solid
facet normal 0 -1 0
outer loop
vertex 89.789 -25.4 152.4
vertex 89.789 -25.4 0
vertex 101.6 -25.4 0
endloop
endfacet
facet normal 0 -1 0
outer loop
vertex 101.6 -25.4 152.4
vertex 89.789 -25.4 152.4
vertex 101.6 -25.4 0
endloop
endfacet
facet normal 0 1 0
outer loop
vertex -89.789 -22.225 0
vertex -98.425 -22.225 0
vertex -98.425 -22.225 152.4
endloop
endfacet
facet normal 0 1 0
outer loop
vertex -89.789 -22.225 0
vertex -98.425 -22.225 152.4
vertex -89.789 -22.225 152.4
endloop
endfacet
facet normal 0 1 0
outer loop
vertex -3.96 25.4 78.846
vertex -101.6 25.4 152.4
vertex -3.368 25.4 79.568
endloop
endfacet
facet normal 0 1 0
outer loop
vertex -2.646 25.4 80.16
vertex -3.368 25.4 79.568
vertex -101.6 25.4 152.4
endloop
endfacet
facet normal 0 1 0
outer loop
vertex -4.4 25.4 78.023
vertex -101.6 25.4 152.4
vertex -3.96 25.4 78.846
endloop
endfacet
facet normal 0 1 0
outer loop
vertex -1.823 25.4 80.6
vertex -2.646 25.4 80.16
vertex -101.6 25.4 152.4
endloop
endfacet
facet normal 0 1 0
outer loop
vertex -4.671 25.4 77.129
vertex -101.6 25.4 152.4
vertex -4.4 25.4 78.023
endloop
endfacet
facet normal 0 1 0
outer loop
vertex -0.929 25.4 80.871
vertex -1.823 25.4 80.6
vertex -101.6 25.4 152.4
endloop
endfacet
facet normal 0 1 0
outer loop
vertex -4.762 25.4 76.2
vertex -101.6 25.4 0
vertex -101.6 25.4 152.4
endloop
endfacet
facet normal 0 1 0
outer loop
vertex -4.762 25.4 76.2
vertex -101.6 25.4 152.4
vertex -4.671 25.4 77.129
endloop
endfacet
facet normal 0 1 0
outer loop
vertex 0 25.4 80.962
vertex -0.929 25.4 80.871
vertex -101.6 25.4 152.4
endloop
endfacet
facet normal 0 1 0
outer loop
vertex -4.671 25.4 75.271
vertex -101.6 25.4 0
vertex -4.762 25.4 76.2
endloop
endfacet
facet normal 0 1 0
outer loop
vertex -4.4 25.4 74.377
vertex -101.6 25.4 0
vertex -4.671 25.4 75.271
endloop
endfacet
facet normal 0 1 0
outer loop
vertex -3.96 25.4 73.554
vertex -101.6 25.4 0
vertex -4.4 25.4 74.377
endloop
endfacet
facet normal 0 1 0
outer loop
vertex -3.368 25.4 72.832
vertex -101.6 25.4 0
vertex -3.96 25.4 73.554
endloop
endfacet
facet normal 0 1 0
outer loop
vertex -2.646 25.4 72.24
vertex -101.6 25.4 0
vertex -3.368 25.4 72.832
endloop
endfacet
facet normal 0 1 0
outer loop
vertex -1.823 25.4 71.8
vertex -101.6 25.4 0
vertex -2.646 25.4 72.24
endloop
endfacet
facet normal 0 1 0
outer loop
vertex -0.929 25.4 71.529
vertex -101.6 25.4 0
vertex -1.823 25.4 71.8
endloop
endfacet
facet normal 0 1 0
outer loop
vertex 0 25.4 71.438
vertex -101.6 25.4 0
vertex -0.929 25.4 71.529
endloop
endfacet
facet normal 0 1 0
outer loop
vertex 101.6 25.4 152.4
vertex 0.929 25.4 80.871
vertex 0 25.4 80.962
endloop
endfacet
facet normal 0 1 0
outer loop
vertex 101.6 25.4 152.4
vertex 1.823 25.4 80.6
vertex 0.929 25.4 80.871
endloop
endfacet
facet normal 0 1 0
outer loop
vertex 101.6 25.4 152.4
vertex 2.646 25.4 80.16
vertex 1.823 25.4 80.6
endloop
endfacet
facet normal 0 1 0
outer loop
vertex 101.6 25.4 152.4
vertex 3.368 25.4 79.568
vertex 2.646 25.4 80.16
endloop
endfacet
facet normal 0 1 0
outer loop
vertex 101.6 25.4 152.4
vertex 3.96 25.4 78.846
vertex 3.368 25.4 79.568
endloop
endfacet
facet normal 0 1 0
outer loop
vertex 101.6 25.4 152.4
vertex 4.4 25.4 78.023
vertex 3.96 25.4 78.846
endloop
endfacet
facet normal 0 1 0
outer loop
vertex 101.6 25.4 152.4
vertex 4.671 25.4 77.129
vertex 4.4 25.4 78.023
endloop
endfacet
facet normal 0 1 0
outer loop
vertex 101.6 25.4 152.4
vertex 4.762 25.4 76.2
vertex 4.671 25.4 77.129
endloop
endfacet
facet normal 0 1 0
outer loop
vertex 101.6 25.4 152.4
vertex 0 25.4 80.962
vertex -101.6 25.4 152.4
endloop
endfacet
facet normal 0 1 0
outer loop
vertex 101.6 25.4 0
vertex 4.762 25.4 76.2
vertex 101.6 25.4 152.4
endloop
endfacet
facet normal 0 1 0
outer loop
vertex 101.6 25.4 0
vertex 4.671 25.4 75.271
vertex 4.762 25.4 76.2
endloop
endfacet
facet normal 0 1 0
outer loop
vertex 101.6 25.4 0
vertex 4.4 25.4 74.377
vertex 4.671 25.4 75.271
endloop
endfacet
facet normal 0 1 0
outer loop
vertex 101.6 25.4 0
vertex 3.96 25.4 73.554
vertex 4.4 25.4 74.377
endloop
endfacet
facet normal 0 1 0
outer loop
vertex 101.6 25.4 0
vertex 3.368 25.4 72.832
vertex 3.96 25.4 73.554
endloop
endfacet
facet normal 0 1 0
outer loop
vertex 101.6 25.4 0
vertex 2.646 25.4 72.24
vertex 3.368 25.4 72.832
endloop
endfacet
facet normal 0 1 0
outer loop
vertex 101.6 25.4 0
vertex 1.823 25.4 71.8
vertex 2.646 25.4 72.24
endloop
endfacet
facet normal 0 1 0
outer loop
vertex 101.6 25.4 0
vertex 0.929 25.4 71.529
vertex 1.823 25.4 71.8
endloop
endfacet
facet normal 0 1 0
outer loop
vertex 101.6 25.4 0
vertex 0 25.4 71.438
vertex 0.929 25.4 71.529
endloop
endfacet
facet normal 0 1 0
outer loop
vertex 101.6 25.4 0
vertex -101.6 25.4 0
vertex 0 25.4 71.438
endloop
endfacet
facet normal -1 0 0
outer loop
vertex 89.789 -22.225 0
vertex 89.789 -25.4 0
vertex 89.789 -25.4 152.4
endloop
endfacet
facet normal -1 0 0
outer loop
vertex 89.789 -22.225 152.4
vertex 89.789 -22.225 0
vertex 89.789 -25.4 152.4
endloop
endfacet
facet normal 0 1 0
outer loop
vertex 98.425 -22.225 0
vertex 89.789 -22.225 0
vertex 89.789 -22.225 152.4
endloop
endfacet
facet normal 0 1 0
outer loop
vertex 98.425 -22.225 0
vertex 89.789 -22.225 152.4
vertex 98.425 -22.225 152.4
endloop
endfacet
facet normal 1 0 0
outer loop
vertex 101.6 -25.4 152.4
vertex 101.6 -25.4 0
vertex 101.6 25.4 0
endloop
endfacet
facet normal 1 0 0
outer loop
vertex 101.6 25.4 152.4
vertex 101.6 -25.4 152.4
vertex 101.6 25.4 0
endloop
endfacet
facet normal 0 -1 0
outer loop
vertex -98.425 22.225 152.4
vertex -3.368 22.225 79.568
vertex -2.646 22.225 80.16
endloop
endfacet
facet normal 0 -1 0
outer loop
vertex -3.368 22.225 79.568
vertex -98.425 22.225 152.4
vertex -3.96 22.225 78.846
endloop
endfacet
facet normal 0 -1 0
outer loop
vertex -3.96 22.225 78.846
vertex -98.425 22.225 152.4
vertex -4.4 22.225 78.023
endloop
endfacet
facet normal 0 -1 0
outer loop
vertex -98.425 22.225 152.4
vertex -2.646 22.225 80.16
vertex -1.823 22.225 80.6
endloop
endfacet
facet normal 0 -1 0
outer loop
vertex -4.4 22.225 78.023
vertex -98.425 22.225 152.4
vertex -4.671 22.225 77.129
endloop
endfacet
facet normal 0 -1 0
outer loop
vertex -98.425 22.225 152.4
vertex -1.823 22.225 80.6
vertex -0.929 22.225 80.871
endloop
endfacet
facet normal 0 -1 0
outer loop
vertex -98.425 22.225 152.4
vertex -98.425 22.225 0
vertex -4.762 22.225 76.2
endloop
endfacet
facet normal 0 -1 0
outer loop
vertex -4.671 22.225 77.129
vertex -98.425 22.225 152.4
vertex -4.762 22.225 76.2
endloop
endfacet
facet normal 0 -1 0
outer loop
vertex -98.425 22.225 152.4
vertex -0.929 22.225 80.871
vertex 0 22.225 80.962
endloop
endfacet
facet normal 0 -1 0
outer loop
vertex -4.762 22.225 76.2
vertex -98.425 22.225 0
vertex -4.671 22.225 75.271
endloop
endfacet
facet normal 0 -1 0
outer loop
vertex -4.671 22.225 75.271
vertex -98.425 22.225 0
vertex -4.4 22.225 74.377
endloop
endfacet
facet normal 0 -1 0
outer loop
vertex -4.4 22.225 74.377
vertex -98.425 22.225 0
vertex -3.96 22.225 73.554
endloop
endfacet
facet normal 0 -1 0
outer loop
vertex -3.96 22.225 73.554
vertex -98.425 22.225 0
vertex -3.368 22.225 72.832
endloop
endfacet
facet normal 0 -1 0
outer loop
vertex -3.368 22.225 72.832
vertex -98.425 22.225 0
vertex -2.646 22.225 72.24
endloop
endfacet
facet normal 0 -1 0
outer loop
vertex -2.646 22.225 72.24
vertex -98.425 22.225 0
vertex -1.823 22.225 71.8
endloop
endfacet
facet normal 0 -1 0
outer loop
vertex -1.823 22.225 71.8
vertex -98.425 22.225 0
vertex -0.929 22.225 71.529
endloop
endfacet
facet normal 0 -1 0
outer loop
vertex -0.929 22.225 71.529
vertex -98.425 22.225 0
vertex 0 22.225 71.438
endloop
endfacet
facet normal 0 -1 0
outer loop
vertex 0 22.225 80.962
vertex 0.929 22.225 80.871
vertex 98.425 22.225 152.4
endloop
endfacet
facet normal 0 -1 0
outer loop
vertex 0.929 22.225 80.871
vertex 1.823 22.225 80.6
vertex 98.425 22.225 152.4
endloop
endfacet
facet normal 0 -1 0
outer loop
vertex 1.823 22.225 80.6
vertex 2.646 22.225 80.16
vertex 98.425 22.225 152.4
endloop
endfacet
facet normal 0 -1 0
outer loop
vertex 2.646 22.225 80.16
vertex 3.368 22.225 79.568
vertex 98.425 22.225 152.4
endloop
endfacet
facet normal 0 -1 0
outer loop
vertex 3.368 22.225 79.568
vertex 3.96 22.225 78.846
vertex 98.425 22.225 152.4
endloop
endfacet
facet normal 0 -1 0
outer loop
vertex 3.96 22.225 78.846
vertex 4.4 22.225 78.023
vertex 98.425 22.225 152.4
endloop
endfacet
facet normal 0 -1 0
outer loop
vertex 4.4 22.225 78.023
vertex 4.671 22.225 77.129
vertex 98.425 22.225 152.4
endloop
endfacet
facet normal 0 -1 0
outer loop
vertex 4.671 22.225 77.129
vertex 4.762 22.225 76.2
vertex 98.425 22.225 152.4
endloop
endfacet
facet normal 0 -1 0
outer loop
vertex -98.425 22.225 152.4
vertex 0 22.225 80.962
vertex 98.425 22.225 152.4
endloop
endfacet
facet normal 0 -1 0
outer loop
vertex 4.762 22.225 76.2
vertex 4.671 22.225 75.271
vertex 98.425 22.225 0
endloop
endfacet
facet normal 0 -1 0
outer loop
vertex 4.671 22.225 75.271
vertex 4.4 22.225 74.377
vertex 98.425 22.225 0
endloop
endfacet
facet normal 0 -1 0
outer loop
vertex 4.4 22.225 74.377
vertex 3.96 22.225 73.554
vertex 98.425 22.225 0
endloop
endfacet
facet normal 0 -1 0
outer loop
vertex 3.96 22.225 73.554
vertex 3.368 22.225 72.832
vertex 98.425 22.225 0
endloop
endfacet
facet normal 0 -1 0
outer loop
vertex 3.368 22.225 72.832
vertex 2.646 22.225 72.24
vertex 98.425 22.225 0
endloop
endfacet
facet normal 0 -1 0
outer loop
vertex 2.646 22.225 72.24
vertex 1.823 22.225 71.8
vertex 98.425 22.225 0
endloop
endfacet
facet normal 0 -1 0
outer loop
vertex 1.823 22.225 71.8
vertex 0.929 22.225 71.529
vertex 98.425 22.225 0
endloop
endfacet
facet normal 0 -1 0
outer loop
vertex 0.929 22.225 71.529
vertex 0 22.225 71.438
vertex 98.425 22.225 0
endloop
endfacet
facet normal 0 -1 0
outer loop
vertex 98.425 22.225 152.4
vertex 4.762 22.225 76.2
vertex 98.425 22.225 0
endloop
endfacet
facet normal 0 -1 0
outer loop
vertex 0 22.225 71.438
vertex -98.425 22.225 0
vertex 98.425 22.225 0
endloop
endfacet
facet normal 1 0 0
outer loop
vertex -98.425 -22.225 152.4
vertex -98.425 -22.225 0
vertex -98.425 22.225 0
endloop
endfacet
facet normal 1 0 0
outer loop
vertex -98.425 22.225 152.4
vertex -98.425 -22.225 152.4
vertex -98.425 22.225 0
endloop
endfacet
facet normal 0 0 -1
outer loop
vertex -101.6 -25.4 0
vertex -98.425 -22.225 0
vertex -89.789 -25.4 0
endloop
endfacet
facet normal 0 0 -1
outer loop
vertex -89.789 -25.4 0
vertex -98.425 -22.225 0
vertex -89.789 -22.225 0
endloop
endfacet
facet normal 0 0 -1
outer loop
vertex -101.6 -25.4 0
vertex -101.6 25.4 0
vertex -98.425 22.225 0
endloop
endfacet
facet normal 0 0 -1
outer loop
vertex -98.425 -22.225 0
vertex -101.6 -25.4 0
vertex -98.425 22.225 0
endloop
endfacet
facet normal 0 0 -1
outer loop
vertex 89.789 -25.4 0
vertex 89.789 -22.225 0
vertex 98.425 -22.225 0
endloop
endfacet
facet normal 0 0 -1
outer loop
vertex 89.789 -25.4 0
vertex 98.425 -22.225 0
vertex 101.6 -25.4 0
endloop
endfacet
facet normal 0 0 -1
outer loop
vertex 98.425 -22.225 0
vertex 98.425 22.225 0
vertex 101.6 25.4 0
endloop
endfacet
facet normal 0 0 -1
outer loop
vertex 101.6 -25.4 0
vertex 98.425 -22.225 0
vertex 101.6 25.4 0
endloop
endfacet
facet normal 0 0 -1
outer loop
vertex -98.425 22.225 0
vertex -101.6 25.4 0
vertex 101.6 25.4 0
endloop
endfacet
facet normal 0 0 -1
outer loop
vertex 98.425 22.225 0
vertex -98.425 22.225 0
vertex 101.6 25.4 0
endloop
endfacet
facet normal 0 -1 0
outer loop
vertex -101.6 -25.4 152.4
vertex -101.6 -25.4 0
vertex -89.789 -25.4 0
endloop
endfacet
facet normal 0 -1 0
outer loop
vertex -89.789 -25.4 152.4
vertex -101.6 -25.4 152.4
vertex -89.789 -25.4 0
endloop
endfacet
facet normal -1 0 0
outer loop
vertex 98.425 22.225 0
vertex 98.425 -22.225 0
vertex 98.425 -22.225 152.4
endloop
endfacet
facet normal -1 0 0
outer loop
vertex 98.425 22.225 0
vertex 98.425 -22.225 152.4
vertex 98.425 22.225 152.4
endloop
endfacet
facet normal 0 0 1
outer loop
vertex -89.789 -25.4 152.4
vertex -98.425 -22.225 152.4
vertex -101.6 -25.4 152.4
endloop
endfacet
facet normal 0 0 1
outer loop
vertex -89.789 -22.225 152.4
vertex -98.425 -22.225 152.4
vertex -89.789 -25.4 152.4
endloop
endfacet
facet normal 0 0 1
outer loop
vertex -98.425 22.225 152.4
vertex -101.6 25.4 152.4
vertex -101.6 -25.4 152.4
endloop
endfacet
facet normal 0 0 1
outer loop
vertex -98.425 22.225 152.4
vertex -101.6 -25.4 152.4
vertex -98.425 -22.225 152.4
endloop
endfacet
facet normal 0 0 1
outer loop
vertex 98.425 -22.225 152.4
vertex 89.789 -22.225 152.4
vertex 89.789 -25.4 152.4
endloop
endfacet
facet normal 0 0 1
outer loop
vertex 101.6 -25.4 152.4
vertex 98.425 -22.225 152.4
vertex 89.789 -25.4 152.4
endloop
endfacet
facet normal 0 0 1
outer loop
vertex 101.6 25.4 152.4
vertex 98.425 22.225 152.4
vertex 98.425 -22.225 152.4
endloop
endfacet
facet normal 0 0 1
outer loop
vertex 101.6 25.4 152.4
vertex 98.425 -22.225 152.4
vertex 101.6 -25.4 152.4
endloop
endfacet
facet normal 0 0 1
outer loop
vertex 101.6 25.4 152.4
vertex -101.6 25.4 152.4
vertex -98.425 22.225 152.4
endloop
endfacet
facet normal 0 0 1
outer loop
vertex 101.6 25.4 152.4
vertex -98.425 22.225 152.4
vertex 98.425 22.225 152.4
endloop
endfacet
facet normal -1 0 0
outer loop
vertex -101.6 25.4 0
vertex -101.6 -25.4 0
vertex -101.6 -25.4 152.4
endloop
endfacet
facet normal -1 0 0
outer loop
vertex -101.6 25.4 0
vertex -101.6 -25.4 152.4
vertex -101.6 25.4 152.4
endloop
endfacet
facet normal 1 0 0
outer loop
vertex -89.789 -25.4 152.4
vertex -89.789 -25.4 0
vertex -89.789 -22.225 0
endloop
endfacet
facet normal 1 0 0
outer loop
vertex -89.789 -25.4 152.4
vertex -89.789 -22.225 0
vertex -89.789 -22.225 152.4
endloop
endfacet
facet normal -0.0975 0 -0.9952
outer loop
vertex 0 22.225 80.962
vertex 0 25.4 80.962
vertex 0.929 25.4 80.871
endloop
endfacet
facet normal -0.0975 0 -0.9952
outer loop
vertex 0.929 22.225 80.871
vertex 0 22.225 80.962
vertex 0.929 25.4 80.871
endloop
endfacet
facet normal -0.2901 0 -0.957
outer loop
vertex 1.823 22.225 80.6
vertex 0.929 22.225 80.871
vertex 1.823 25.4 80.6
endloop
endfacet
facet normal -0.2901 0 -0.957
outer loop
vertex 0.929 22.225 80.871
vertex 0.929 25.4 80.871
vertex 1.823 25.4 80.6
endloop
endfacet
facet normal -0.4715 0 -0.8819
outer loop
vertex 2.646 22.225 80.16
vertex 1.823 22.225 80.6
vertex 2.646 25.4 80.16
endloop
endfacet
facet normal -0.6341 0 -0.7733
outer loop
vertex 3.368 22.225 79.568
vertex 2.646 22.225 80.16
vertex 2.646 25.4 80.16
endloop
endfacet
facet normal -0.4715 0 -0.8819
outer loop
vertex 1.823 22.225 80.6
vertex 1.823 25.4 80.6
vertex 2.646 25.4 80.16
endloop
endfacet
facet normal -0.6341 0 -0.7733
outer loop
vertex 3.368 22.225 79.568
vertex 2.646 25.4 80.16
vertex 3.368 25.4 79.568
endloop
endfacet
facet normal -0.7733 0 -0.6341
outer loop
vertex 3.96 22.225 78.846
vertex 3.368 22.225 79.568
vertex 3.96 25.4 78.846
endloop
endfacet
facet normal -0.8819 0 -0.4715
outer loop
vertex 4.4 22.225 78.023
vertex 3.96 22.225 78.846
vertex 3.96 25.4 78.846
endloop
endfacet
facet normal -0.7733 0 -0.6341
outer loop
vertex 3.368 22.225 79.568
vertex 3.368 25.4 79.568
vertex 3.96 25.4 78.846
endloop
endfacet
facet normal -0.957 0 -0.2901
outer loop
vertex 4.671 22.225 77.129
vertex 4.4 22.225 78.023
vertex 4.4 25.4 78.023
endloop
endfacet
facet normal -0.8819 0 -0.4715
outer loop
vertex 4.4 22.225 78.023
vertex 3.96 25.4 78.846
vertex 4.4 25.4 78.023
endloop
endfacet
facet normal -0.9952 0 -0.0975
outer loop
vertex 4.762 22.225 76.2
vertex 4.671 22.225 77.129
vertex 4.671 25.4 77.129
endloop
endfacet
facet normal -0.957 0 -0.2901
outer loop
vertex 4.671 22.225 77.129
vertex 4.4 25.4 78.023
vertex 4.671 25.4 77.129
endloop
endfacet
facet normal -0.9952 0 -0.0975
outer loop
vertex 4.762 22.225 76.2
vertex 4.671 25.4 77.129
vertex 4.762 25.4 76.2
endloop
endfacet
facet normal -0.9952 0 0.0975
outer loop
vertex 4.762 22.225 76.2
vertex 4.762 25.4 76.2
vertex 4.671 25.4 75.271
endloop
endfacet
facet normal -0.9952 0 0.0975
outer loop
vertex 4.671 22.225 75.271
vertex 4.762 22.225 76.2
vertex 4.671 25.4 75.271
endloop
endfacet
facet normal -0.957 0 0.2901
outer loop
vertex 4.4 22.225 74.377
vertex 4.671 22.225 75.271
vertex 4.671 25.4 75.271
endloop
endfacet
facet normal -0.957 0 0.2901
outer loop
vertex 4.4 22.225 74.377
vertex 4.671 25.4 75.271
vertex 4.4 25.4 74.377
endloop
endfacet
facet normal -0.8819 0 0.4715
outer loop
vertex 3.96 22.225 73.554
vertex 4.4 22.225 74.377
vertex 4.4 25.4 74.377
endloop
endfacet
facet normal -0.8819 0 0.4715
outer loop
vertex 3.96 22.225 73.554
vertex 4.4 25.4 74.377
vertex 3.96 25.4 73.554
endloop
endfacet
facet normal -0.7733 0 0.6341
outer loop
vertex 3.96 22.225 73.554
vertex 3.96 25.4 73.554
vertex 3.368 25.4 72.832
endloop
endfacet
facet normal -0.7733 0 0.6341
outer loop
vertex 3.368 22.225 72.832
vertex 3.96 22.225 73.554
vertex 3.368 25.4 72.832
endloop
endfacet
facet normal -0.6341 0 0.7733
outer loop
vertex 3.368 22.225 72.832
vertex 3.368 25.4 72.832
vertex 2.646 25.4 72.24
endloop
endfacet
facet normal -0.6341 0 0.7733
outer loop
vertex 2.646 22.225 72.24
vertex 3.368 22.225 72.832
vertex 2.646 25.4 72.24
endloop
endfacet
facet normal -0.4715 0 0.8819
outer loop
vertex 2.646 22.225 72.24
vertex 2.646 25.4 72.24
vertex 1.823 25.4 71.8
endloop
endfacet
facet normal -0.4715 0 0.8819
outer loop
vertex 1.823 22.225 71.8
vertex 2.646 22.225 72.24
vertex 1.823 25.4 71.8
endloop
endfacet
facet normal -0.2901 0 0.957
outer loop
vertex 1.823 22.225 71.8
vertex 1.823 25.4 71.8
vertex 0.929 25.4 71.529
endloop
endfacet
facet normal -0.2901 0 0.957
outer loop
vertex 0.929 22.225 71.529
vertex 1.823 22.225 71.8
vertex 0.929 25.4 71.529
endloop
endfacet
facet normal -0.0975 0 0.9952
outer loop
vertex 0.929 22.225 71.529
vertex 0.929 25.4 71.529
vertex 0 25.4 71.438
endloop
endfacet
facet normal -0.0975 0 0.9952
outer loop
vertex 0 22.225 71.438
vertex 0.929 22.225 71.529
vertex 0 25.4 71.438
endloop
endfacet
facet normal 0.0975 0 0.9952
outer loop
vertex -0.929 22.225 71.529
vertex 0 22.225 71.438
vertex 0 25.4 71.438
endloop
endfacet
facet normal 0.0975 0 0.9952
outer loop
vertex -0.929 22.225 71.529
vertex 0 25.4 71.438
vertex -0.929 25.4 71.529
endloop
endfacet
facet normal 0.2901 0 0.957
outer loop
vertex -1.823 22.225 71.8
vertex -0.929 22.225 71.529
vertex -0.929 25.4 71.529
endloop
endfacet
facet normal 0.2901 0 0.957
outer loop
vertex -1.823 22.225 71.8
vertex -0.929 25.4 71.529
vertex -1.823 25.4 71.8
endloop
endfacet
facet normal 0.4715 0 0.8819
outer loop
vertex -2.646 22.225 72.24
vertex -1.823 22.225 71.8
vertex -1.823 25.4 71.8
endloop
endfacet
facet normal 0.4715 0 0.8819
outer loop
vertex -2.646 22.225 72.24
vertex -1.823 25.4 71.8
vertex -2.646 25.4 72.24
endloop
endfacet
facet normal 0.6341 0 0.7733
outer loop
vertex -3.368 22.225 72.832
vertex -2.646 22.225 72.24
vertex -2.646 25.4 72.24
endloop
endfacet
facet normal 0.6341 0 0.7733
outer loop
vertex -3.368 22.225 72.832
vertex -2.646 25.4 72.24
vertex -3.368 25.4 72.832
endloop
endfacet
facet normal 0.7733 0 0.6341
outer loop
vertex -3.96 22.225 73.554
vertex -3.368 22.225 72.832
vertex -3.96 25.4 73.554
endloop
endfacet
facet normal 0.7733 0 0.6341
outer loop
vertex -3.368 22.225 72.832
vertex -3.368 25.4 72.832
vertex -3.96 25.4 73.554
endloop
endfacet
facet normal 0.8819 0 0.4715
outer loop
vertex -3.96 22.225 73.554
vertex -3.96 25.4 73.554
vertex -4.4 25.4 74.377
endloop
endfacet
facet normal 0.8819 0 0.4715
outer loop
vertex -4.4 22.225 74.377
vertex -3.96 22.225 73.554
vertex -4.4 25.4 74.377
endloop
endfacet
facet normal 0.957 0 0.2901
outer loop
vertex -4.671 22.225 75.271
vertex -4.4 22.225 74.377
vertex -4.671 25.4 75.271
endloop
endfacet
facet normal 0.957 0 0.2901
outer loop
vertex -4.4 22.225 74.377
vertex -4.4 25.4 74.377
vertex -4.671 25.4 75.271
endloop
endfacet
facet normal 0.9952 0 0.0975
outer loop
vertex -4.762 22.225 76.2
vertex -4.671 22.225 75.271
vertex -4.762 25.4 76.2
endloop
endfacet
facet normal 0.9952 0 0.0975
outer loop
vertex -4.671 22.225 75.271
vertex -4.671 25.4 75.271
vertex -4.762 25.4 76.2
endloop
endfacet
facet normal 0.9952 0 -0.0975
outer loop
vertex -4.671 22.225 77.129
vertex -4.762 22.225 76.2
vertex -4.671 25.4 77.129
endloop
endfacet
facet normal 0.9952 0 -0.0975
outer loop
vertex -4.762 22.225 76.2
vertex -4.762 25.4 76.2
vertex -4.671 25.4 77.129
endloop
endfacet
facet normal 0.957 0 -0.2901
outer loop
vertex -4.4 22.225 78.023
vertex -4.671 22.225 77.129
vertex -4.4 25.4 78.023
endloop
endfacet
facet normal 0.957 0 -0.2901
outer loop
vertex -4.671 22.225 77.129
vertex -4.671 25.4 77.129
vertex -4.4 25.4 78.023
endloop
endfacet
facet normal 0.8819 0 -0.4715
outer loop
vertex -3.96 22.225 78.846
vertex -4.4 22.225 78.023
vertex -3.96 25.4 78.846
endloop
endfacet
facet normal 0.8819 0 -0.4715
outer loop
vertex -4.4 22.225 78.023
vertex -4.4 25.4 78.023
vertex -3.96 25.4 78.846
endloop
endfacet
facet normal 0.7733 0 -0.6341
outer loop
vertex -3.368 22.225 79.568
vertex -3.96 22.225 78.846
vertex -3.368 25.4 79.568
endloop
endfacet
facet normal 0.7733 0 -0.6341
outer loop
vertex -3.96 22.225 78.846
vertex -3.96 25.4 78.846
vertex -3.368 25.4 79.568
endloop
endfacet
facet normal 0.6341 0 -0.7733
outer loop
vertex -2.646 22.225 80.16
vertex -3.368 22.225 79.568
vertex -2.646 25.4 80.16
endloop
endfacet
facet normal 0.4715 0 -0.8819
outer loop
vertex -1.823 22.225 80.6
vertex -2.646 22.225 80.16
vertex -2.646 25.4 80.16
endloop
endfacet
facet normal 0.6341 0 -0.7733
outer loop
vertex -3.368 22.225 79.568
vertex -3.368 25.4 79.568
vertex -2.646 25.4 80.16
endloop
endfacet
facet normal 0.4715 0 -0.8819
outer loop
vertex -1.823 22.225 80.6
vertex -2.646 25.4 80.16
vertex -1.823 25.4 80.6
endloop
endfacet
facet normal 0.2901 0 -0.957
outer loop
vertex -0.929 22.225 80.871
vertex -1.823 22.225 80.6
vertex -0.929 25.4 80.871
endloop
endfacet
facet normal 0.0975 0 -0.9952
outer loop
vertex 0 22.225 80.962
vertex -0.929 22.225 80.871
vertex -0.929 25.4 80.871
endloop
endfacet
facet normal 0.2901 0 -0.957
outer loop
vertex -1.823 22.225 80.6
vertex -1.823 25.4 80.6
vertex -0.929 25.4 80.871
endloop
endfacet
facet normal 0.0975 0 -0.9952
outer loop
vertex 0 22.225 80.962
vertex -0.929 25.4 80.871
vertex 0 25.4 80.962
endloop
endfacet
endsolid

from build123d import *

# Parameters (mm, degrees)
SKETCH1_W           = 203.2
SKETCH1_H           = 50.8
SKETCH1_W_2         = 196.85
SKETCH1_H_2         = 44.45
BOSS_EXTRUDE1_DEPTH = 152.4
SKETCH2_W           = 179.578
SKETCH2_H           = 152.4
CUT_EXTRUDE1_DEPTH  = 3.175
SKETCH3_R           = 4.7625
CUT_EXTRUDE2_DEPTH  = 191.076195248


with BuildPart() as part:
    # Sketch1 → Boss-Extrude1 (new body)
    with BuildSketch(Plane.XY):
        Rectangle(SKETCH1_W, SKETCH1_H)
        Rectangle(SKETCH1_W_2, SKETCH1_H_2, mode=Mode.SUBTRACT)
    extrude(amount=BOSS_EXTRUDE1_DEPTH)

    # Sketch2 → Cut-Extrude1 (cut)
    with BuildSketch(Plane.XZ.offset(25.4)):
        with Locations((0, 76.2)):
            Rectangle(SKETCH2_W, SKETCH2_H)
    extrude(amount=-CUT_EXTRUDE1_DEPTH, mode=Mode.SUBTRACT)

    # Sketch3 → Cut-Extrude2 (cut, through all)
    with BuildSketch(Plane(origin=(0, 25.4, 0), x_dir=(1, 0, 0), z_dir=(0, 1, 0))):
        with Locations(Location((0, -76.2, 0), (0, 0, 270))):
            Circle(SKETCH3_R)
    extrude(amount=-CUT_EXTRUDE2_DEPTH, mode=Mode.SUBTRACT)


solid = part.part
